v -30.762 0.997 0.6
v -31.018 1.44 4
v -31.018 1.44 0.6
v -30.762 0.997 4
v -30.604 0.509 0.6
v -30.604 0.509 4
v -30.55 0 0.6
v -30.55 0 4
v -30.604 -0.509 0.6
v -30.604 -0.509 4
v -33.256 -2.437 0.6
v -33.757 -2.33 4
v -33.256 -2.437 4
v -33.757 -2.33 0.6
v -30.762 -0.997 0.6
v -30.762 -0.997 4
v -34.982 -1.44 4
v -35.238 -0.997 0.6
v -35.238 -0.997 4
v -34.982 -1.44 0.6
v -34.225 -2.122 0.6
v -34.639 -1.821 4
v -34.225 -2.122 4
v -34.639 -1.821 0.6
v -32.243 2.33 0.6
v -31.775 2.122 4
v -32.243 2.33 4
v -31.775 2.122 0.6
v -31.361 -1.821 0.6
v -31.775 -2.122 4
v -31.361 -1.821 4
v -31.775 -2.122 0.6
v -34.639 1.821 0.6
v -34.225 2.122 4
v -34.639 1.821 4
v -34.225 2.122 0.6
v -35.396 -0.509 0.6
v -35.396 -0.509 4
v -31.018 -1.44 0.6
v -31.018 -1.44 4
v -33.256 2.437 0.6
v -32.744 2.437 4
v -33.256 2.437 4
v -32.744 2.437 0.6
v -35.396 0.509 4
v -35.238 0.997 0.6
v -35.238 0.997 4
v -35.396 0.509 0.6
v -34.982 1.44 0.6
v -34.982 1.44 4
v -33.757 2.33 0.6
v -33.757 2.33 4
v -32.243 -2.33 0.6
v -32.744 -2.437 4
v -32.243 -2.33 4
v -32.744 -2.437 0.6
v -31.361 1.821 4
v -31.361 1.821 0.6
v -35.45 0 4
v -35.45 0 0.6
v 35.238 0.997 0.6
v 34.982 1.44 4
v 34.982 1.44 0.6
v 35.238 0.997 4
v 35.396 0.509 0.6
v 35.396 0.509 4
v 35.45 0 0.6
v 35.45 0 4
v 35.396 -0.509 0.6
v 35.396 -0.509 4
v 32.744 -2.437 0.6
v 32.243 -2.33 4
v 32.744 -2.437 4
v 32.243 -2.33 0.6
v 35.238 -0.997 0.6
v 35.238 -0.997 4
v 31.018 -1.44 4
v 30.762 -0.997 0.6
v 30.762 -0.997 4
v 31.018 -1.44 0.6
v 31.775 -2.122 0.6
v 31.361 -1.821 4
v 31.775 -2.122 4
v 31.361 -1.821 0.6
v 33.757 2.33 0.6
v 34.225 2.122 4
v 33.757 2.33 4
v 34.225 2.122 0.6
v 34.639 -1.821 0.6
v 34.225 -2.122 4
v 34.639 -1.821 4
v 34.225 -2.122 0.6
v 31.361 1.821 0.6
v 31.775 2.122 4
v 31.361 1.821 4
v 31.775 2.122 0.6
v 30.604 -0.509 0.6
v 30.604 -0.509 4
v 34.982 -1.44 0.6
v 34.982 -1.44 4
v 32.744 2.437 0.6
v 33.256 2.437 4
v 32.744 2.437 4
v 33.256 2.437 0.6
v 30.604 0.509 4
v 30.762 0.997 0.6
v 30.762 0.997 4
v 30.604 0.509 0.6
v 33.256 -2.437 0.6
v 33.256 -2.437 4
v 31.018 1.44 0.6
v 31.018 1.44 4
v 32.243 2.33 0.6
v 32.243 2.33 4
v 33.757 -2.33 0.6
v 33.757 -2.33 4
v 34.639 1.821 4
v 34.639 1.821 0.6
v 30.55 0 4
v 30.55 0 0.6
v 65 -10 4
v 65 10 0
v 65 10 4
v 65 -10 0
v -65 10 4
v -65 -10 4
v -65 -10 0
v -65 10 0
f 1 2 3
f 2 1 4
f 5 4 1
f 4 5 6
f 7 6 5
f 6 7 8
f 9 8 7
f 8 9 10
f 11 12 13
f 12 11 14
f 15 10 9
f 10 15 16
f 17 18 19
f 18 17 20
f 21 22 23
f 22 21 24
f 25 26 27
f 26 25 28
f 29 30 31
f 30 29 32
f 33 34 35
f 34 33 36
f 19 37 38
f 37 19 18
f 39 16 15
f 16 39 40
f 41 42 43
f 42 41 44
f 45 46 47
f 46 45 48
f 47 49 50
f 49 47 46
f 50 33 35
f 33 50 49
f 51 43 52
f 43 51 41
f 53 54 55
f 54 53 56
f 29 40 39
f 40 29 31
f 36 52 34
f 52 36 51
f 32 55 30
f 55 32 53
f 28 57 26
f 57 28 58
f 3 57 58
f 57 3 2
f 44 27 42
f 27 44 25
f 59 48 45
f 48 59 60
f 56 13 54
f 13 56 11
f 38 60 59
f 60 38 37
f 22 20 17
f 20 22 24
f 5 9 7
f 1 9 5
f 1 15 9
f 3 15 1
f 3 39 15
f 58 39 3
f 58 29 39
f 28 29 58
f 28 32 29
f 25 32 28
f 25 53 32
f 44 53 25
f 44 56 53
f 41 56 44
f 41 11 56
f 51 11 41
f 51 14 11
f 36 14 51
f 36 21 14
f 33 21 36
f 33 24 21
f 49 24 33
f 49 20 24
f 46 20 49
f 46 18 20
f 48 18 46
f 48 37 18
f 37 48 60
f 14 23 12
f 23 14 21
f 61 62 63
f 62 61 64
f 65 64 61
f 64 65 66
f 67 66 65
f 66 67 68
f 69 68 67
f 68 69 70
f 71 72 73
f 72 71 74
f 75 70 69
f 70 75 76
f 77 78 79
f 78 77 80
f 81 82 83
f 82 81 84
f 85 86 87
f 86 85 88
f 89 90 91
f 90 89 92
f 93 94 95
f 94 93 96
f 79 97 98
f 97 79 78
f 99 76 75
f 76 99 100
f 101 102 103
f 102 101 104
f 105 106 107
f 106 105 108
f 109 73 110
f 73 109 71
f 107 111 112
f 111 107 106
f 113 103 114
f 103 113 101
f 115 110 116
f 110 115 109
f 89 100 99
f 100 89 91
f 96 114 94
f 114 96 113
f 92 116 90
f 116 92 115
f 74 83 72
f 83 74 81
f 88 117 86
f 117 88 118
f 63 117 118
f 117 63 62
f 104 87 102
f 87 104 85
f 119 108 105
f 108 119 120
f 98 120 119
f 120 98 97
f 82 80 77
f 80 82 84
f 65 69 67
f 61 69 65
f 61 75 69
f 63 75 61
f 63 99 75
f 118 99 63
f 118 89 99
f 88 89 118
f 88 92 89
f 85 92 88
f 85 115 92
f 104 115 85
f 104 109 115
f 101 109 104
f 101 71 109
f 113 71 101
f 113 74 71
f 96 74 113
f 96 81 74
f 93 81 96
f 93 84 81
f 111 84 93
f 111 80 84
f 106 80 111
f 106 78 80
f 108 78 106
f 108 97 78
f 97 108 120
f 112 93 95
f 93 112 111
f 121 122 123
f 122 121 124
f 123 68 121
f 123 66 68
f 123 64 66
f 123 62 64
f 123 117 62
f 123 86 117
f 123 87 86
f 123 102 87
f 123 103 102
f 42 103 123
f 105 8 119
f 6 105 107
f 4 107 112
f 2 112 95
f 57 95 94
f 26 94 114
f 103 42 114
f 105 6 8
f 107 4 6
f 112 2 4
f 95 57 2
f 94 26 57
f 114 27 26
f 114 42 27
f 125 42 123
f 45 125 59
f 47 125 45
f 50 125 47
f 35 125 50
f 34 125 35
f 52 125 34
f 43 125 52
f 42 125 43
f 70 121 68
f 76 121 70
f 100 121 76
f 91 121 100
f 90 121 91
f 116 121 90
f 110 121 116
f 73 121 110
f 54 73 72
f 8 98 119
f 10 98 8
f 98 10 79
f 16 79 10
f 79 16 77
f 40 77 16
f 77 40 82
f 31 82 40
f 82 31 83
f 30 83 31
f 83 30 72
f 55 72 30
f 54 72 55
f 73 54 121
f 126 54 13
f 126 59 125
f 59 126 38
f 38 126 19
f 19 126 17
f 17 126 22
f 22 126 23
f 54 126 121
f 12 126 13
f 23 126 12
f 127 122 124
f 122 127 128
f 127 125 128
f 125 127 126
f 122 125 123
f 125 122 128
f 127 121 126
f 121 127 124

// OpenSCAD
eps = 0.1;
X = [1, 0, 0];
Y = [0, 1, 0];
Z = [0, 0, 1];

H = 4;

module centered_cube(dims, z=0) {
    translate([-dims[0]/2, -dims[1]/2, z])
        cube(dims);
}

module endplug() {
    difference() {
        centered_cube([130, 20, H]);
        for (x = [-33, +33])
            translate([x, 0, H - 3.4])
                cylinder(d=4.9, h=3.4 + eps, $fs = 0.1);
    }
}

endplug();
